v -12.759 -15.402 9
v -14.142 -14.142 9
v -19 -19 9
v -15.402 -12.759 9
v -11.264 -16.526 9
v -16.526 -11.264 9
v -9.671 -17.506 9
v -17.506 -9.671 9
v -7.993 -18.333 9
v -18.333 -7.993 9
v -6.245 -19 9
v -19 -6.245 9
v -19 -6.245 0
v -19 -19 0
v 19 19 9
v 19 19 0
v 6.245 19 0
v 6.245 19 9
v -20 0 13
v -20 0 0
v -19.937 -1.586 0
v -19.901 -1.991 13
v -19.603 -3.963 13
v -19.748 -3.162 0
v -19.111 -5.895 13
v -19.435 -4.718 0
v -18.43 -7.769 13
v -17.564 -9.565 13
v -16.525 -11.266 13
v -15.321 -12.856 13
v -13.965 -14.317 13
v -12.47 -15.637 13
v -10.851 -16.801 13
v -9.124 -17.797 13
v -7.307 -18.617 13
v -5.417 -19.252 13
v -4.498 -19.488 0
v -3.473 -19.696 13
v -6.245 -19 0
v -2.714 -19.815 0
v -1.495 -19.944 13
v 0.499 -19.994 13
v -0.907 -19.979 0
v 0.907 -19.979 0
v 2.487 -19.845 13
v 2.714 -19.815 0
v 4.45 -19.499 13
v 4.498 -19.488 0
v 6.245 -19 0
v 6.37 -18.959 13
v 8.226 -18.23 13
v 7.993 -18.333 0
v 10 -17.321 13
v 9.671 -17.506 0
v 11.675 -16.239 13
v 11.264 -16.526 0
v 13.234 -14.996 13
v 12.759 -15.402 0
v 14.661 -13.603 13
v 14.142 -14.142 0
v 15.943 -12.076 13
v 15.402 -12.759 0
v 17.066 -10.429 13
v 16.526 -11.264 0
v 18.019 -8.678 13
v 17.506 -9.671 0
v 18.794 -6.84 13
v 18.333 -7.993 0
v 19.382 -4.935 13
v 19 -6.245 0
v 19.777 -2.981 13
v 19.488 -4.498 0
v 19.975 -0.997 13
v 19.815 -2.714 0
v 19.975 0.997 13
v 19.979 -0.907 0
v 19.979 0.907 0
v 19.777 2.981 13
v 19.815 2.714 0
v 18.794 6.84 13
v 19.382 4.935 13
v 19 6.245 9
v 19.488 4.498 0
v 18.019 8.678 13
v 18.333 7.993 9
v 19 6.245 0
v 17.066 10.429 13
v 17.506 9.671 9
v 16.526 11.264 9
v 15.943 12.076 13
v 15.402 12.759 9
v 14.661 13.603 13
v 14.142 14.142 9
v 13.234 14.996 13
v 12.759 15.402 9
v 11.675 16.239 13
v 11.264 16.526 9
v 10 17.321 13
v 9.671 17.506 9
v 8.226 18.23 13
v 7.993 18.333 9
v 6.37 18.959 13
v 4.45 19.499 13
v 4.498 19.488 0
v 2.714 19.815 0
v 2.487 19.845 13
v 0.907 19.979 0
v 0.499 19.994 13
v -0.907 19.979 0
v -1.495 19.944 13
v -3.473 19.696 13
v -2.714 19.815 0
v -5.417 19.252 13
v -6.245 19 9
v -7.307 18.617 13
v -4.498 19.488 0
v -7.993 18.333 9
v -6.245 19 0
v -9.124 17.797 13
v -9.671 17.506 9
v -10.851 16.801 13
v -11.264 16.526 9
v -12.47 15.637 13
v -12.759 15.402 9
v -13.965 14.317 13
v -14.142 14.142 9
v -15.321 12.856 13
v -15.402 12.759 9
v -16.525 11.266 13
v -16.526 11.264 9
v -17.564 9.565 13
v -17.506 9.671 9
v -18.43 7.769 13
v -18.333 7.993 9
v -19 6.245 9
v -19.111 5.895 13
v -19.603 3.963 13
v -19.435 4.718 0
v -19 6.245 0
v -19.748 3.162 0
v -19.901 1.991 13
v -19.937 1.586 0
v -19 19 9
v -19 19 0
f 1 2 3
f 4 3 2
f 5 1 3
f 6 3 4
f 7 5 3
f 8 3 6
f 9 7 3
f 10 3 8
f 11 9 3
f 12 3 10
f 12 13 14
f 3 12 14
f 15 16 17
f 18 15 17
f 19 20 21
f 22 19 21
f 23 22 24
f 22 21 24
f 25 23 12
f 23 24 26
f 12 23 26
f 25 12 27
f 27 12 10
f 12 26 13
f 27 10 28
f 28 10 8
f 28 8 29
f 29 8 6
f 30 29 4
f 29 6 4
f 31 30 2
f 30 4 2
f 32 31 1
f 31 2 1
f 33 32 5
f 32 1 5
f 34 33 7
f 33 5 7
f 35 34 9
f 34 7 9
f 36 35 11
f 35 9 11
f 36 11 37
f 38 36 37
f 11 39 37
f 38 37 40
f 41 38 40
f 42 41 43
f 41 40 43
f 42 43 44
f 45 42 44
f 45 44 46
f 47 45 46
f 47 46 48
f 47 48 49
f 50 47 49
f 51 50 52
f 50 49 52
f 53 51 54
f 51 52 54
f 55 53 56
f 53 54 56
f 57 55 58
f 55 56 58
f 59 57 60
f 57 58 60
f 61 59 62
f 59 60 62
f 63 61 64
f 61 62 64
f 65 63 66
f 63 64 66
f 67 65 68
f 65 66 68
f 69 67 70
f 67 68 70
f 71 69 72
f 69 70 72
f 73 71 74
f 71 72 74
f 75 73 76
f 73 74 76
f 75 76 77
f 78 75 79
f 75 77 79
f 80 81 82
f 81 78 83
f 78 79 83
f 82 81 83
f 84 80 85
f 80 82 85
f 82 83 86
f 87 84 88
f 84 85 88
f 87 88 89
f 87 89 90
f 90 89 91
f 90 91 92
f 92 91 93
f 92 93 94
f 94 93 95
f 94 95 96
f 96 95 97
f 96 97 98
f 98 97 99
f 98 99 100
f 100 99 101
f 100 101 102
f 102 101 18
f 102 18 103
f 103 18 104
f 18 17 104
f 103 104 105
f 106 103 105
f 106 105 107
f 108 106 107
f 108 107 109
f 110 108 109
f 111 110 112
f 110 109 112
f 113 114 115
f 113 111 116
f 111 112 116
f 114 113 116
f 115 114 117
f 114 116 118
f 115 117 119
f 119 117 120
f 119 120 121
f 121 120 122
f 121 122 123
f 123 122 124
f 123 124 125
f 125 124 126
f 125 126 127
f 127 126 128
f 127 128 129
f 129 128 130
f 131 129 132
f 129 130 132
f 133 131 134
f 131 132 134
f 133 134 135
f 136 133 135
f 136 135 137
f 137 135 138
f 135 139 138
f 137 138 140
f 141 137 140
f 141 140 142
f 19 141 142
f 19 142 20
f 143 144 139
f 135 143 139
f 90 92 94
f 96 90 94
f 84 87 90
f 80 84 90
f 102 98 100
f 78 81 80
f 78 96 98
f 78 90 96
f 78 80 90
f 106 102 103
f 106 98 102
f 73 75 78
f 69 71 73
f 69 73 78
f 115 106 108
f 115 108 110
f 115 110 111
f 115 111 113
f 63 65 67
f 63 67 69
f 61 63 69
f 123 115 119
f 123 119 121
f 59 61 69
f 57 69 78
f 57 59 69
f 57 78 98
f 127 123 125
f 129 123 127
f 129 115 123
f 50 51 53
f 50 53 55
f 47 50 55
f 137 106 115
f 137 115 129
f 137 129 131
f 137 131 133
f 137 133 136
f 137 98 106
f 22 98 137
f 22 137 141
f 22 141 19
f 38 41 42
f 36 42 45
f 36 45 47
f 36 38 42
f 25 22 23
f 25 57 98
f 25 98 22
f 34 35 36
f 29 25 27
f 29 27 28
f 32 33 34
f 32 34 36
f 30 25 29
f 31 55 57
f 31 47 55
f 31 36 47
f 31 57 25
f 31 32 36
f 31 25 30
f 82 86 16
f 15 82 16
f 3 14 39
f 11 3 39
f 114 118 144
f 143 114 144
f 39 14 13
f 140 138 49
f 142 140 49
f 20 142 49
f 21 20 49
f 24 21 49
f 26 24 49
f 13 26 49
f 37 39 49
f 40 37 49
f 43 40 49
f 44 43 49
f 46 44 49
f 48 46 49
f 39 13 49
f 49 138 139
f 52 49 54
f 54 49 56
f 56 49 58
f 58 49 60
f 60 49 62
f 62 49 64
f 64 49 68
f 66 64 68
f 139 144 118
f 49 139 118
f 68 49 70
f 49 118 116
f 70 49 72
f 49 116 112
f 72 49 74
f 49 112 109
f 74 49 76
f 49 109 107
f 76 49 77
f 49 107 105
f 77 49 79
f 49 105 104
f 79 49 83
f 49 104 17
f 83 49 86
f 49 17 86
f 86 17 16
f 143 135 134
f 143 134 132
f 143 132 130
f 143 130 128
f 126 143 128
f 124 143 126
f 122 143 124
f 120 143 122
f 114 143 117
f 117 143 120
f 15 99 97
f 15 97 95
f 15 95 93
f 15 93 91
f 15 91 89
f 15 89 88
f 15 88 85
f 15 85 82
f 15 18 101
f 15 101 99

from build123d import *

# Parameters (mm, degrees)
SKETCH1_R           = 20
BOSS_EXTRUDE1_DEPTH = 13
BOSS_EXTRUDE2_DEPTH = 9


with BuildPart() as part:
    # Sketch1 → Boss-Extrude1 (new body)
    with BuildSketch(Plane.XY):
        with Locations(Location((0, 0, 0), (0, 0, 180))):
            Circle(SKETCH1_R)
    extrude(amount=BOSS_EXTRUDE1_DEPTH)

    # Sketch2 → Boss-Extrude2 (add)
    with BuildSketch(Plane(origin=(0, 0, 0), x_dir=(-1, 0, 0), z_dir=(0, 0, -1))):
        with BuildLine():
            Line((-19, 19), (19, 19))
            Line((19, 19), (19, -19))
            Line((19, -19), (-6.244997998, -19))
            ThreePointArc((-6.244997998, -19), (-14.142135624, -14.142135624), (-19, -6.244997998))
            Line((-19, -6.244997998), (-19, 19))
        make_face()
    extrude(amount=-BOSS_EXTRUDE2_DEPTH)


solid = part.part
